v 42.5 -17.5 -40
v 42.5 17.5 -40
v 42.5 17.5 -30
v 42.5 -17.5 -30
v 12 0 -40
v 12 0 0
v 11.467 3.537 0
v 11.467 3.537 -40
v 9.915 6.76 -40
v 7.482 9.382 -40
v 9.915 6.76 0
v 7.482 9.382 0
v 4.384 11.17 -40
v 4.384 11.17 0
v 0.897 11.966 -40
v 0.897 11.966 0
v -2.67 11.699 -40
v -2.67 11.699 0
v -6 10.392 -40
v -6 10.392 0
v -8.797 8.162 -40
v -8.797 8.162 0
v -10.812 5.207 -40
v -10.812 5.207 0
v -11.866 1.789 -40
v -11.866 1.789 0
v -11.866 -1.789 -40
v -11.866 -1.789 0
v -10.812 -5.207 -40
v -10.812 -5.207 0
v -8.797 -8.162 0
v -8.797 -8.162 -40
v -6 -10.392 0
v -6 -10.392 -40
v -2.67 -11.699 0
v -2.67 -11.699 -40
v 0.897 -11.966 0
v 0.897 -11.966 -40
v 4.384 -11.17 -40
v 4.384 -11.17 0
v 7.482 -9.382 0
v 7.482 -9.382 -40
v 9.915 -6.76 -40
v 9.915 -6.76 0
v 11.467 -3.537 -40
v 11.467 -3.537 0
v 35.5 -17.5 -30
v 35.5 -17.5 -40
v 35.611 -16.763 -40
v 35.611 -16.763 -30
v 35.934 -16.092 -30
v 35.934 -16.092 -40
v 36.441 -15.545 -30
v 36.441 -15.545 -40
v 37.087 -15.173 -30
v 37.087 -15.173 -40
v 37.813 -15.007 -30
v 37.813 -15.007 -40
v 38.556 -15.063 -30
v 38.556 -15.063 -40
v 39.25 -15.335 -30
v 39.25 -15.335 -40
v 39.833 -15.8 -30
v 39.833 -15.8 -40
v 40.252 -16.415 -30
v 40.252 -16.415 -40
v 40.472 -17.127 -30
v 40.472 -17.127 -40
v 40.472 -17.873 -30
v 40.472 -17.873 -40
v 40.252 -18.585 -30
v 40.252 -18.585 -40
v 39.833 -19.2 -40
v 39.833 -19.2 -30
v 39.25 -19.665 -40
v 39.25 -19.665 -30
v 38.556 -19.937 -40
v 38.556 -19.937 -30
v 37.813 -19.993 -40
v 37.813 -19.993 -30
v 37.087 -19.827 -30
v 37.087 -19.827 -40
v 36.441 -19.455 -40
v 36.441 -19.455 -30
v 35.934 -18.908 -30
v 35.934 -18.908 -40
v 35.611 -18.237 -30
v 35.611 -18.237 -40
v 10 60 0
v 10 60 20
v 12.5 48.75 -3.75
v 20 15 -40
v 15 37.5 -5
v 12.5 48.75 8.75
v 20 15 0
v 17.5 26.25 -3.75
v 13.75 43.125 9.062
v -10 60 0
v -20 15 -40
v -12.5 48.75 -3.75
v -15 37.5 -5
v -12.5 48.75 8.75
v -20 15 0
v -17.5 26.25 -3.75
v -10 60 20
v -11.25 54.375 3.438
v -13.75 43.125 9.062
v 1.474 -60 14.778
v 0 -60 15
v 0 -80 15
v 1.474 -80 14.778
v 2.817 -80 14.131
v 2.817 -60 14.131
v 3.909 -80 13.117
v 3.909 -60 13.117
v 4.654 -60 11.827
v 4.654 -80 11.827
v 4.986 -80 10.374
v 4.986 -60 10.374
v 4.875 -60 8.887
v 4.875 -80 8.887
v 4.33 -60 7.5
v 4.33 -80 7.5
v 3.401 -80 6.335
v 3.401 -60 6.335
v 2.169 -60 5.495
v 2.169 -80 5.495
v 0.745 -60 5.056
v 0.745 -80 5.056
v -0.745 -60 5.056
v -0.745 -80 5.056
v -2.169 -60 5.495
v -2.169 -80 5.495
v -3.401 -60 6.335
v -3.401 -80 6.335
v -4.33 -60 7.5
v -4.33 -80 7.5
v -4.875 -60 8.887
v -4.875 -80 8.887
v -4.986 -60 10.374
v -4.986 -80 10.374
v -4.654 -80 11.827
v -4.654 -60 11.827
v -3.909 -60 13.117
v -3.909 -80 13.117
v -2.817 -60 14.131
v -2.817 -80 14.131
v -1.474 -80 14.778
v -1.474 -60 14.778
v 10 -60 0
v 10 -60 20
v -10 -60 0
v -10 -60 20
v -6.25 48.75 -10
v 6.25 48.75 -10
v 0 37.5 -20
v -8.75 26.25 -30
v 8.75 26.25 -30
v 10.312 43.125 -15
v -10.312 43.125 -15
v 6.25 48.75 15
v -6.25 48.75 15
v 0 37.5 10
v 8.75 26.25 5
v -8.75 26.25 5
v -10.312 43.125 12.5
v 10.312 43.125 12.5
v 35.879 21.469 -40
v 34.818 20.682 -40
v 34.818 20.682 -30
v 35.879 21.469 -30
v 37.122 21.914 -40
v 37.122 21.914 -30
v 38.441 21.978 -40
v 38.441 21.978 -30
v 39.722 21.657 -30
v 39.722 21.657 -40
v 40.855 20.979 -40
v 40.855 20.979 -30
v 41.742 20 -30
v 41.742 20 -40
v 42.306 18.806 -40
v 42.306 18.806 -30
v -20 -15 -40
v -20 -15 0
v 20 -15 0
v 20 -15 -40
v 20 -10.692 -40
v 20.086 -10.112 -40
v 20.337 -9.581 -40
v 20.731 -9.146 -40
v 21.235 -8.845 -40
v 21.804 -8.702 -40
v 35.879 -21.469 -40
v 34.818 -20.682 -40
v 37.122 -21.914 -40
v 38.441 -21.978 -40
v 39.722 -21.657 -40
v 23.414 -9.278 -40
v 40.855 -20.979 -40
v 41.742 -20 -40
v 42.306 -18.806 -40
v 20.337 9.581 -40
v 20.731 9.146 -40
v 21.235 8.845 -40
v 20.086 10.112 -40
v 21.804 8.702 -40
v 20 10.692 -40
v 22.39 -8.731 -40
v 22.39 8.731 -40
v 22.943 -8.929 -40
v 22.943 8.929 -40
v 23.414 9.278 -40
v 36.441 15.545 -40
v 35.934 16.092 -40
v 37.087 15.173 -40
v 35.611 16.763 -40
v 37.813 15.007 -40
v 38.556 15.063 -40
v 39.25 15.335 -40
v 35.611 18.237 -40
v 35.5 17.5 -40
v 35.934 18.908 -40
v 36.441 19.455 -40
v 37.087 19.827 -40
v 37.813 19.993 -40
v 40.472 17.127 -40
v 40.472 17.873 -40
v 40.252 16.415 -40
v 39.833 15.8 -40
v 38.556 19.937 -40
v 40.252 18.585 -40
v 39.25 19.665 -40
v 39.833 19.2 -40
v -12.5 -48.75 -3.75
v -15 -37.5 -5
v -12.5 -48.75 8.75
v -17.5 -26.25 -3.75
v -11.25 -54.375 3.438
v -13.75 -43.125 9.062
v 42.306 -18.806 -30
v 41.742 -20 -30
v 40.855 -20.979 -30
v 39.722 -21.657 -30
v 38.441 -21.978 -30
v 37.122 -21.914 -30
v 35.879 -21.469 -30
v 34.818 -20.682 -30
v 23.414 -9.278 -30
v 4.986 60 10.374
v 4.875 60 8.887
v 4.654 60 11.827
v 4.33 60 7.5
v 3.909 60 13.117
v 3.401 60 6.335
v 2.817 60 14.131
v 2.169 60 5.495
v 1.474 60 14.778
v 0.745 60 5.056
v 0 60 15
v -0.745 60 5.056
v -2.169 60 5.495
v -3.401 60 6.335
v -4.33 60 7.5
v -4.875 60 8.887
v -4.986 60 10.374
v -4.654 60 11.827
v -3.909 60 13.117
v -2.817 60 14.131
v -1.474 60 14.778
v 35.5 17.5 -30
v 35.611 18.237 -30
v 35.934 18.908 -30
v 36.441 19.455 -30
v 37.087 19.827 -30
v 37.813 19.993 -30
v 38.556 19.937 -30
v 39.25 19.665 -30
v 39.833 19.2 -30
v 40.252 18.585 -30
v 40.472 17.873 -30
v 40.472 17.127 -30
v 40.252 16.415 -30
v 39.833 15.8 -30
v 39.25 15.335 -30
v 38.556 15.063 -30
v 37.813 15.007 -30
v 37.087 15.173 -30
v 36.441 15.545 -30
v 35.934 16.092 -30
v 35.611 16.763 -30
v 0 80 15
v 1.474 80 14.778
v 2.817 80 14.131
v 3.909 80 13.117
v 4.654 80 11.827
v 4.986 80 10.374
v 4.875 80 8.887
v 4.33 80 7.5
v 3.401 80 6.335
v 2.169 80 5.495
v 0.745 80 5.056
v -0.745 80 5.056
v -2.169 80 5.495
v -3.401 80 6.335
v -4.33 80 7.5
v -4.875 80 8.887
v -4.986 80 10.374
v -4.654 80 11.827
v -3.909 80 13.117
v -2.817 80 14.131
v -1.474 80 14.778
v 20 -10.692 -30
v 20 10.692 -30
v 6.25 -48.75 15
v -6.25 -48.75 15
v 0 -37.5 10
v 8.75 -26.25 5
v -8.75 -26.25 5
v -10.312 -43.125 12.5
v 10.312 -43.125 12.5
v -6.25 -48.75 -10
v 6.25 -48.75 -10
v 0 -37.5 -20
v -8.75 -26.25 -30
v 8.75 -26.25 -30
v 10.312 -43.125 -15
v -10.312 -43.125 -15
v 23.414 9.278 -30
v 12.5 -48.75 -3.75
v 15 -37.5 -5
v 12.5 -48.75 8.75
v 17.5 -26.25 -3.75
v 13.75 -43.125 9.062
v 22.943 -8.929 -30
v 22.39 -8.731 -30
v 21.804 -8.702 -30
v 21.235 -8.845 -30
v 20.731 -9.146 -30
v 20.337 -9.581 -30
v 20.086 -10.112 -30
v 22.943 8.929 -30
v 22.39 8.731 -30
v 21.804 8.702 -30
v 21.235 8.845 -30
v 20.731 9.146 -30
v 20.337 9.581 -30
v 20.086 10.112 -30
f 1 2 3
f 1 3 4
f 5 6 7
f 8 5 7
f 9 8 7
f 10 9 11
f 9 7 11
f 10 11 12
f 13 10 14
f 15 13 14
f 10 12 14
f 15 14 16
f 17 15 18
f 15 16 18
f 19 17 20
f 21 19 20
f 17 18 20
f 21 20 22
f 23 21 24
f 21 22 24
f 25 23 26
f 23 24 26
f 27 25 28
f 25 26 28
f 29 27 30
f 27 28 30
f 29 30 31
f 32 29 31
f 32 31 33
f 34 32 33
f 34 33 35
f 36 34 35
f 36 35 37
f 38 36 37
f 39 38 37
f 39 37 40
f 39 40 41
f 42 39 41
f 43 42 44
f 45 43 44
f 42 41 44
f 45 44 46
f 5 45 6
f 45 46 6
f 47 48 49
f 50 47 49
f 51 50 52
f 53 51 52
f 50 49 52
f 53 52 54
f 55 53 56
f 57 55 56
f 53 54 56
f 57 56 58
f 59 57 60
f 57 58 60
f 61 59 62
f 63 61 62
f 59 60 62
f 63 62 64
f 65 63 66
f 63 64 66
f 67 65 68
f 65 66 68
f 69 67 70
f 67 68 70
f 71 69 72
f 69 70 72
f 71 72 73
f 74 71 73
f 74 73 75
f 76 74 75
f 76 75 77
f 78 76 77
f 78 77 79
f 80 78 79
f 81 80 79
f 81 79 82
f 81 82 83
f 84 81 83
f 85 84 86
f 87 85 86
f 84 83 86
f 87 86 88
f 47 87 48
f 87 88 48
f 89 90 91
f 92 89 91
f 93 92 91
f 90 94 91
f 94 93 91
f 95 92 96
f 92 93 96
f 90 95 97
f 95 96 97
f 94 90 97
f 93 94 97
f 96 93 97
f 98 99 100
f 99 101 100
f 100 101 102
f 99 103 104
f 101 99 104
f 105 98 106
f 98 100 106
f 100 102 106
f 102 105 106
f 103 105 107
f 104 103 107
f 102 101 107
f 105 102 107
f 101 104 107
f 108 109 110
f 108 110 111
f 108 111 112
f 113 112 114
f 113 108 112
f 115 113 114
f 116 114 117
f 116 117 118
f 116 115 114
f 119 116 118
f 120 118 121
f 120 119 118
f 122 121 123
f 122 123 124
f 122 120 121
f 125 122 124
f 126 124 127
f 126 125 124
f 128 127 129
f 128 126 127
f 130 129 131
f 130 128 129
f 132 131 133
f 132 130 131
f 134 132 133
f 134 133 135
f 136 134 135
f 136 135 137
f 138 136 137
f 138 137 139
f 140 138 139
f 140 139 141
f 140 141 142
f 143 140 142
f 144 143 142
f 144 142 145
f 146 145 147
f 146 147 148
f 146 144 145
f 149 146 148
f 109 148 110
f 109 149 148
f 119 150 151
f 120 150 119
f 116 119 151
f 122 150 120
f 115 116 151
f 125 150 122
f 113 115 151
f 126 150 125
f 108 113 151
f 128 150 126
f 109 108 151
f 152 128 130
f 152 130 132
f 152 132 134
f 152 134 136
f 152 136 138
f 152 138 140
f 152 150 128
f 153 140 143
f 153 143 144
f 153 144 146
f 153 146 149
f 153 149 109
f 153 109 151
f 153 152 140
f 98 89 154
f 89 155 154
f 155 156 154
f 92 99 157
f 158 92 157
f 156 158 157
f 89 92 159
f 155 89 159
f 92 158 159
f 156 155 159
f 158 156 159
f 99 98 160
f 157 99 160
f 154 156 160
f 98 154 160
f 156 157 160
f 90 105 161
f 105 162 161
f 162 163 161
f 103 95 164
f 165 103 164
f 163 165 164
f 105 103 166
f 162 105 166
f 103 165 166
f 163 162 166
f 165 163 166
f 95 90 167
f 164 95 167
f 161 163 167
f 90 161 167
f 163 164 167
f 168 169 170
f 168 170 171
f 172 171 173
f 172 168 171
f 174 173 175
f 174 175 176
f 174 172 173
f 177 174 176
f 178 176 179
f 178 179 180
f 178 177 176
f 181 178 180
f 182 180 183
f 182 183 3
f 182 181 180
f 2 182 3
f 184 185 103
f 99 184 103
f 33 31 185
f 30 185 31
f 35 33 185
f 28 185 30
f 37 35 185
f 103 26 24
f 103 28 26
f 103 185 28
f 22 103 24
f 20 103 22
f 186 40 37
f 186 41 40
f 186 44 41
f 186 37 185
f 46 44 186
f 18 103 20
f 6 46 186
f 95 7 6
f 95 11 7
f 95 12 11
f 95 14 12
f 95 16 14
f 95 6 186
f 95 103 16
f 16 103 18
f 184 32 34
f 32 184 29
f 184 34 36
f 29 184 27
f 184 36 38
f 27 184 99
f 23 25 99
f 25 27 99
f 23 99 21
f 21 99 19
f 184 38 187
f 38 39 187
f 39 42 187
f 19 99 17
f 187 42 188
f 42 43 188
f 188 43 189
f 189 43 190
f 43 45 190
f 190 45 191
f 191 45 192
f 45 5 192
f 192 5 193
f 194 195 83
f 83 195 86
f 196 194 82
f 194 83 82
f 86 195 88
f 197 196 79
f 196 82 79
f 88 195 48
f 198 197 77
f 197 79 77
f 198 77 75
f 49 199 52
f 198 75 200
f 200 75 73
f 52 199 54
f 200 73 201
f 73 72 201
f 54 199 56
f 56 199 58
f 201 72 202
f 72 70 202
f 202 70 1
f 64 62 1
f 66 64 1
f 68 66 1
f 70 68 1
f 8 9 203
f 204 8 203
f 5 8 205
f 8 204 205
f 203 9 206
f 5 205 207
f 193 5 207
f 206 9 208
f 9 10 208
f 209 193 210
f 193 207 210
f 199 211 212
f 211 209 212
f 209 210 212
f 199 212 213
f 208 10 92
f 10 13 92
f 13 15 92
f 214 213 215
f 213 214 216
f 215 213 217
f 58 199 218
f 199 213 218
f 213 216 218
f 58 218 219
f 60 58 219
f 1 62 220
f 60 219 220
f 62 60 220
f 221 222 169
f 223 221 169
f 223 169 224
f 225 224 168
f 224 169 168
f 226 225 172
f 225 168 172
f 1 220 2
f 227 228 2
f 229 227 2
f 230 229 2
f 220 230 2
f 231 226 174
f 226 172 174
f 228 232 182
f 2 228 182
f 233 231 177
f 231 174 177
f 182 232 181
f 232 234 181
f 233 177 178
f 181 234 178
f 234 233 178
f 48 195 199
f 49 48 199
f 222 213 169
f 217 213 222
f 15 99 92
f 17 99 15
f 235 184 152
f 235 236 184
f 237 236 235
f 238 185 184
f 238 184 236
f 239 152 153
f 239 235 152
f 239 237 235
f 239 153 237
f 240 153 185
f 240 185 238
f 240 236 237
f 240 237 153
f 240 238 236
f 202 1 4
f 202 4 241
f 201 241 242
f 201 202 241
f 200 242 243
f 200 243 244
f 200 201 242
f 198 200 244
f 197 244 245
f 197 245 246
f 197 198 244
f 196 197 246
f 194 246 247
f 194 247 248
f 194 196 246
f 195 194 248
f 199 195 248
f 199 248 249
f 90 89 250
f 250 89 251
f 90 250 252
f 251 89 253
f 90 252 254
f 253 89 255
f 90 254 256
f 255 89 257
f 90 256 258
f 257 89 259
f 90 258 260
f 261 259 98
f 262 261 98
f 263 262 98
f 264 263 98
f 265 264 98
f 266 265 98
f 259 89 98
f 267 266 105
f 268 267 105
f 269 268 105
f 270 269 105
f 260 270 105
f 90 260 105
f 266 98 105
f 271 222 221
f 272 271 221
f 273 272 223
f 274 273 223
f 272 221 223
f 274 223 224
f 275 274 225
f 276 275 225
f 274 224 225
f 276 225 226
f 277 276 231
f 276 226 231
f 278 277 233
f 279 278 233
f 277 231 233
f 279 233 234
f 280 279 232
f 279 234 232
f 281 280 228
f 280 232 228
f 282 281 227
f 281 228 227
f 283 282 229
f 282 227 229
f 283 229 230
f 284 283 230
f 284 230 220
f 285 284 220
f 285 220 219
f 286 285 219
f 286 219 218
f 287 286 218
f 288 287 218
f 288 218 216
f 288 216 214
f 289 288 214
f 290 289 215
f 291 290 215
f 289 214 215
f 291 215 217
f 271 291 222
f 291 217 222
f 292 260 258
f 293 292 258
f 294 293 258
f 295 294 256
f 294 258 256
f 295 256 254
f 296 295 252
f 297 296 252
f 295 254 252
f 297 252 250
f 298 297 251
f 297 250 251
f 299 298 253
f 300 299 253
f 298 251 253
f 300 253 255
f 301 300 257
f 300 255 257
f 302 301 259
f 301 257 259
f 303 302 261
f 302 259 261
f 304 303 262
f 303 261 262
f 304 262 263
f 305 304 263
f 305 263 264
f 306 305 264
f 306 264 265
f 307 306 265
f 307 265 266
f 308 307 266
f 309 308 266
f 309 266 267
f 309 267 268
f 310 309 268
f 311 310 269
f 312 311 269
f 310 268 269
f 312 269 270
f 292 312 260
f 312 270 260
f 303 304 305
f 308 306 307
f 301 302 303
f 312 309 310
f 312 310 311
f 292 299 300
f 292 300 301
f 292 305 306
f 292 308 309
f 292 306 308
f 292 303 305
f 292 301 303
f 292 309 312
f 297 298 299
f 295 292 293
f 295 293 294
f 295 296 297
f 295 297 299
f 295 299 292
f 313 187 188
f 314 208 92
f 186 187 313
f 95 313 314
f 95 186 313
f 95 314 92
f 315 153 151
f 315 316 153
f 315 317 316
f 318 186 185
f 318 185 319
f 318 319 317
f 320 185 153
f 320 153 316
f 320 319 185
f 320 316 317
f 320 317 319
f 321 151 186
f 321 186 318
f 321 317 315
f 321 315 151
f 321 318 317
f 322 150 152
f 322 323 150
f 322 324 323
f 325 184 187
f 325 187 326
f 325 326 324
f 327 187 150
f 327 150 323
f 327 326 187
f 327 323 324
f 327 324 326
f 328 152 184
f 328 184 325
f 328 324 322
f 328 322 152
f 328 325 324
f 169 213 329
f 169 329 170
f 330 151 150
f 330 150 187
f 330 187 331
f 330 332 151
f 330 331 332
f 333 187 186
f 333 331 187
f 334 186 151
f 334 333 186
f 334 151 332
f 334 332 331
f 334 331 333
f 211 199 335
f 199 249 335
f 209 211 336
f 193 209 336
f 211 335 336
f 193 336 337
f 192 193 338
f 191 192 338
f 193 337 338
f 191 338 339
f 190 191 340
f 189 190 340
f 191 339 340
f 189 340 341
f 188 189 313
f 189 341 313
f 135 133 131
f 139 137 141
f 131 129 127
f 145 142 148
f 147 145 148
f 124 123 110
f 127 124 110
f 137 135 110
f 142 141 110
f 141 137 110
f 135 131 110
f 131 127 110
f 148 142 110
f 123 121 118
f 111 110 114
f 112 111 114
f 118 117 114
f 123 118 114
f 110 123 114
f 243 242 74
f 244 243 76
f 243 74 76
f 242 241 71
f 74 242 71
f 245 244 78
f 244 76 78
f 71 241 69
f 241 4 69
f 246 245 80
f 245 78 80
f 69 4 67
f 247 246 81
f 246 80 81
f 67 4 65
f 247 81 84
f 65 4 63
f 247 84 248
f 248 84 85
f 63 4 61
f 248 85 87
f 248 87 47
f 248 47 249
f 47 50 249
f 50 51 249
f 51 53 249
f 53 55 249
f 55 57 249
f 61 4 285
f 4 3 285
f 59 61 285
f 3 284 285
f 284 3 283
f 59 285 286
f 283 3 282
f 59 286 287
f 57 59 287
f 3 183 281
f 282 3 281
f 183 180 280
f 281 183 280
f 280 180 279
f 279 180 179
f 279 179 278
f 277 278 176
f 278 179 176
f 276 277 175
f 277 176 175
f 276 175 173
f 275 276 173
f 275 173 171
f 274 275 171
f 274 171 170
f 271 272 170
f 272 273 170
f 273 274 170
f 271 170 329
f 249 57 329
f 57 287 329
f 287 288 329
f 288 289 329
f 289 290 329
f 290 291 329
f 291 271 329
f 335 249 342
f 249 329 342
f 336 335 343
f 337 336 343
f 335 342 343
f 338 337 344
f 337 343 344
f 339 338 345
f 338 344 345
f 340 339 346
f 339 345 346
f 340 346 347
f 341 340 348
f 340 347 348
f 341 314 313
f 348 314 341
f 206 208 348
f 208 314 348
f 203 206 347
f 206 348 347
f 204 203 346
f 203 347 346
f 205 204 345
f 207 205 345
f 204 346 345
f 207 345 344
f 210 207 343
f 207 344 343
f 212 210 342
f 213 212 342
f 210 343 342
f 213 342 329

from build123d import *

# Parameters (mm, degrees)
ESQUISSE1_W        = 40
ESQUISSE1_H        = 30
ESQUISSE1_R        = 12
BOSS_EXTRU_1_DEPTH = 40
ESQUISSE3_R        = 5
BOSS_EXTRU_2_DEPTH = 20
ESQUISSE4_R        = 2.5
BOSS_EXTRU_3_DEPTH = 10
CONG_1_R           = 2
CONG_2_R           = 2


with BuildPart() as part:
    # Esquisse1 → Boss.-Extru.1 (new body)
    with BuildSketch(Plane.XY):
        Rectangle(ESQUISSE1_W, ESQUISSE1_H)
        Circle(ESQUISSE1_R, mode=Mode.SUBTRACT)
    extrude(amount=-BOSS_EXTRU_1_DEPTH)

    # Esquisse2 → section 0 of lissage1
    with BuildSketch(Plane(origin=(0, 60, 0), x_dir=(1, 0, 0), z_dir=(0, 1, 0)), mode=Mode.PRIVATE) as lissage1_s0:
        with BuildLine():
            Line((10, 0), (-10, 0))
            Line((-10, 0), (-10, -20))
            Line((-10, -20), (10, -20))
            Line((10, -20), (10, 0))
        make_face()
    # loft up to a face of the part (lissage1)
    loft([lissage1_s0.sketch, part.faces().sort_by_distance((0, 15, -20))[0]])

    # Esquisse3 → Boss.-Extru.2 (add)
    with BuildSketch(Plane(origin=(0, 60, 0), x_dir=(1, 0, 0), z_dir=(0, 1, 0))):
        with Locations(Location((0, -10, 0), (0, 0, 270))):
            Circle(ESQUISSE3_R)
    extrude(amount=BOSS_EXTRU_2_DEPTH)

    # Symétrie7: part across plane


with BuildPart() as part_1:
    add(part.part)
    add(part.part.mirror(Plane.ZX))

    # Esquisse4 → Boss.-Extru.3 (add)
    with BuildSketch(Plane(origin=(0, 0, -40), x_dir=(-1, 0, 0), z_dir=(0, 0, -1))):
        with BuildLine():
            Line((-20, 5.863961031), (-34.818019485, 20.681980515))
            ThreePointArc((-34.818019485, 20.681980515), (-39.722075446, 21.657457896), (-42.5, 17.5))
            Line((-42.5, 17.5), (-42.5, -17.5))
            ThreePointArc((-42.5, -17.5), (-39.722075446, -21.657457896), (-34.818019485, -20.681980515))
            Line((-34.818019485, -20.681980515), (-20, -5.863961031))
            Line((-20, -5.863961031), (-20, 5.863961031))
        make_face()
        with Locations((-38, 17.5)):
            Circle(ESQUISSE4_R, mode=Mode.SUBTRACT)
        with Locations((-38, -17.5)):
            Circle(ESQUISSE4_R, mode=Mode.SUBTRACT)
    extrude(amount=-BOSS_EXTRU_3_DEPTH)

    # Congé1
    cong_1_edges = [part_1.edges().sort_by_distance(p)[0] for p in [
        (20, 5.863961031, -35),
    ]]
    fillet(cong_1_edges, radius=CONG_1_R)

    # Congé2
    cong_2_edges = [part_1.edges().sort_by_distance(p)[0] for p in [
        (20, -5.863961031, -35),
    ]]
    fillet(cong_2_edges, radius=CONG_2_R)


solid = part_1.part
